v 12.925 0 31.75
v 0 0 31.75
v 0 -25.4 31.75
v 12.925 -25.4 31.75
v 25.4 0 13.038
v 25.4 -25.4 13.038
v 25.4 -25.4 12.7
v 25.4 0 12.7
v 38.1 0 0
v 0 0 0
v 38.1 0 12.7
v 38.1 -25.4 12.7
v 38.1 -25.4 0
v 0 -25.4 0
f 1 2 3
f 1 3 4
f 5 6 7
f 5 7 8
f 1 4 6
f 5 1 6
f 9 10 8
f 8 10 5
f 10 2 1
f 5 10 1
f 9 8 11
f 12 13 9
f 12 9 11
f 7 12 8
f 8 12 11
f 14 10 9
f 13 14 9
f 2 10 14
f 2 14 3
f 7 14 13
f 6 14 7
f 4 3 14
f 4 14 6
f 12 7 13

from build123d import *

# Parameters (mm, degrees)
F0_W     = 38.1
F0_H     = 31.75
F1_DEPTH = 25.4
F2_W     = 25.4
F2_H     = 19.05
F4_DEPTH = 12.7
F6_DEPTH = 25.401


with BuildPart() as f1:
    # F0 (on Front) → F1 (new body)
    with BuildSketch(Plane.XZ):
        with Locations((19.05, 15.875)):
            Rectangle(F0_W, F0_H)
    extrude(amount=F1_DEPTH)

    # F2 (on face) → F4 (cut)
    with BuildSketch(Plane.YZ.offset(38.1)):
        with Locations((-12.7, 22.225)):
            Rectangle(F2_W, F2_H)
    extrude(amount=-F4_DEPTH, mode=Mode.SUBTRACT)

    # F5 (on face) → F6 (cut, through all)
    with BuildSketch(Plane.XZ.offset(25.4)):
        Polygon((12.925296, 31.75), (25.609119, 12.724266), (25.609119, 31.75), align=None)
    extrude(amount=-F6_DEPTH, mode=Mode.SUBTRACT)


solid = f1.part
